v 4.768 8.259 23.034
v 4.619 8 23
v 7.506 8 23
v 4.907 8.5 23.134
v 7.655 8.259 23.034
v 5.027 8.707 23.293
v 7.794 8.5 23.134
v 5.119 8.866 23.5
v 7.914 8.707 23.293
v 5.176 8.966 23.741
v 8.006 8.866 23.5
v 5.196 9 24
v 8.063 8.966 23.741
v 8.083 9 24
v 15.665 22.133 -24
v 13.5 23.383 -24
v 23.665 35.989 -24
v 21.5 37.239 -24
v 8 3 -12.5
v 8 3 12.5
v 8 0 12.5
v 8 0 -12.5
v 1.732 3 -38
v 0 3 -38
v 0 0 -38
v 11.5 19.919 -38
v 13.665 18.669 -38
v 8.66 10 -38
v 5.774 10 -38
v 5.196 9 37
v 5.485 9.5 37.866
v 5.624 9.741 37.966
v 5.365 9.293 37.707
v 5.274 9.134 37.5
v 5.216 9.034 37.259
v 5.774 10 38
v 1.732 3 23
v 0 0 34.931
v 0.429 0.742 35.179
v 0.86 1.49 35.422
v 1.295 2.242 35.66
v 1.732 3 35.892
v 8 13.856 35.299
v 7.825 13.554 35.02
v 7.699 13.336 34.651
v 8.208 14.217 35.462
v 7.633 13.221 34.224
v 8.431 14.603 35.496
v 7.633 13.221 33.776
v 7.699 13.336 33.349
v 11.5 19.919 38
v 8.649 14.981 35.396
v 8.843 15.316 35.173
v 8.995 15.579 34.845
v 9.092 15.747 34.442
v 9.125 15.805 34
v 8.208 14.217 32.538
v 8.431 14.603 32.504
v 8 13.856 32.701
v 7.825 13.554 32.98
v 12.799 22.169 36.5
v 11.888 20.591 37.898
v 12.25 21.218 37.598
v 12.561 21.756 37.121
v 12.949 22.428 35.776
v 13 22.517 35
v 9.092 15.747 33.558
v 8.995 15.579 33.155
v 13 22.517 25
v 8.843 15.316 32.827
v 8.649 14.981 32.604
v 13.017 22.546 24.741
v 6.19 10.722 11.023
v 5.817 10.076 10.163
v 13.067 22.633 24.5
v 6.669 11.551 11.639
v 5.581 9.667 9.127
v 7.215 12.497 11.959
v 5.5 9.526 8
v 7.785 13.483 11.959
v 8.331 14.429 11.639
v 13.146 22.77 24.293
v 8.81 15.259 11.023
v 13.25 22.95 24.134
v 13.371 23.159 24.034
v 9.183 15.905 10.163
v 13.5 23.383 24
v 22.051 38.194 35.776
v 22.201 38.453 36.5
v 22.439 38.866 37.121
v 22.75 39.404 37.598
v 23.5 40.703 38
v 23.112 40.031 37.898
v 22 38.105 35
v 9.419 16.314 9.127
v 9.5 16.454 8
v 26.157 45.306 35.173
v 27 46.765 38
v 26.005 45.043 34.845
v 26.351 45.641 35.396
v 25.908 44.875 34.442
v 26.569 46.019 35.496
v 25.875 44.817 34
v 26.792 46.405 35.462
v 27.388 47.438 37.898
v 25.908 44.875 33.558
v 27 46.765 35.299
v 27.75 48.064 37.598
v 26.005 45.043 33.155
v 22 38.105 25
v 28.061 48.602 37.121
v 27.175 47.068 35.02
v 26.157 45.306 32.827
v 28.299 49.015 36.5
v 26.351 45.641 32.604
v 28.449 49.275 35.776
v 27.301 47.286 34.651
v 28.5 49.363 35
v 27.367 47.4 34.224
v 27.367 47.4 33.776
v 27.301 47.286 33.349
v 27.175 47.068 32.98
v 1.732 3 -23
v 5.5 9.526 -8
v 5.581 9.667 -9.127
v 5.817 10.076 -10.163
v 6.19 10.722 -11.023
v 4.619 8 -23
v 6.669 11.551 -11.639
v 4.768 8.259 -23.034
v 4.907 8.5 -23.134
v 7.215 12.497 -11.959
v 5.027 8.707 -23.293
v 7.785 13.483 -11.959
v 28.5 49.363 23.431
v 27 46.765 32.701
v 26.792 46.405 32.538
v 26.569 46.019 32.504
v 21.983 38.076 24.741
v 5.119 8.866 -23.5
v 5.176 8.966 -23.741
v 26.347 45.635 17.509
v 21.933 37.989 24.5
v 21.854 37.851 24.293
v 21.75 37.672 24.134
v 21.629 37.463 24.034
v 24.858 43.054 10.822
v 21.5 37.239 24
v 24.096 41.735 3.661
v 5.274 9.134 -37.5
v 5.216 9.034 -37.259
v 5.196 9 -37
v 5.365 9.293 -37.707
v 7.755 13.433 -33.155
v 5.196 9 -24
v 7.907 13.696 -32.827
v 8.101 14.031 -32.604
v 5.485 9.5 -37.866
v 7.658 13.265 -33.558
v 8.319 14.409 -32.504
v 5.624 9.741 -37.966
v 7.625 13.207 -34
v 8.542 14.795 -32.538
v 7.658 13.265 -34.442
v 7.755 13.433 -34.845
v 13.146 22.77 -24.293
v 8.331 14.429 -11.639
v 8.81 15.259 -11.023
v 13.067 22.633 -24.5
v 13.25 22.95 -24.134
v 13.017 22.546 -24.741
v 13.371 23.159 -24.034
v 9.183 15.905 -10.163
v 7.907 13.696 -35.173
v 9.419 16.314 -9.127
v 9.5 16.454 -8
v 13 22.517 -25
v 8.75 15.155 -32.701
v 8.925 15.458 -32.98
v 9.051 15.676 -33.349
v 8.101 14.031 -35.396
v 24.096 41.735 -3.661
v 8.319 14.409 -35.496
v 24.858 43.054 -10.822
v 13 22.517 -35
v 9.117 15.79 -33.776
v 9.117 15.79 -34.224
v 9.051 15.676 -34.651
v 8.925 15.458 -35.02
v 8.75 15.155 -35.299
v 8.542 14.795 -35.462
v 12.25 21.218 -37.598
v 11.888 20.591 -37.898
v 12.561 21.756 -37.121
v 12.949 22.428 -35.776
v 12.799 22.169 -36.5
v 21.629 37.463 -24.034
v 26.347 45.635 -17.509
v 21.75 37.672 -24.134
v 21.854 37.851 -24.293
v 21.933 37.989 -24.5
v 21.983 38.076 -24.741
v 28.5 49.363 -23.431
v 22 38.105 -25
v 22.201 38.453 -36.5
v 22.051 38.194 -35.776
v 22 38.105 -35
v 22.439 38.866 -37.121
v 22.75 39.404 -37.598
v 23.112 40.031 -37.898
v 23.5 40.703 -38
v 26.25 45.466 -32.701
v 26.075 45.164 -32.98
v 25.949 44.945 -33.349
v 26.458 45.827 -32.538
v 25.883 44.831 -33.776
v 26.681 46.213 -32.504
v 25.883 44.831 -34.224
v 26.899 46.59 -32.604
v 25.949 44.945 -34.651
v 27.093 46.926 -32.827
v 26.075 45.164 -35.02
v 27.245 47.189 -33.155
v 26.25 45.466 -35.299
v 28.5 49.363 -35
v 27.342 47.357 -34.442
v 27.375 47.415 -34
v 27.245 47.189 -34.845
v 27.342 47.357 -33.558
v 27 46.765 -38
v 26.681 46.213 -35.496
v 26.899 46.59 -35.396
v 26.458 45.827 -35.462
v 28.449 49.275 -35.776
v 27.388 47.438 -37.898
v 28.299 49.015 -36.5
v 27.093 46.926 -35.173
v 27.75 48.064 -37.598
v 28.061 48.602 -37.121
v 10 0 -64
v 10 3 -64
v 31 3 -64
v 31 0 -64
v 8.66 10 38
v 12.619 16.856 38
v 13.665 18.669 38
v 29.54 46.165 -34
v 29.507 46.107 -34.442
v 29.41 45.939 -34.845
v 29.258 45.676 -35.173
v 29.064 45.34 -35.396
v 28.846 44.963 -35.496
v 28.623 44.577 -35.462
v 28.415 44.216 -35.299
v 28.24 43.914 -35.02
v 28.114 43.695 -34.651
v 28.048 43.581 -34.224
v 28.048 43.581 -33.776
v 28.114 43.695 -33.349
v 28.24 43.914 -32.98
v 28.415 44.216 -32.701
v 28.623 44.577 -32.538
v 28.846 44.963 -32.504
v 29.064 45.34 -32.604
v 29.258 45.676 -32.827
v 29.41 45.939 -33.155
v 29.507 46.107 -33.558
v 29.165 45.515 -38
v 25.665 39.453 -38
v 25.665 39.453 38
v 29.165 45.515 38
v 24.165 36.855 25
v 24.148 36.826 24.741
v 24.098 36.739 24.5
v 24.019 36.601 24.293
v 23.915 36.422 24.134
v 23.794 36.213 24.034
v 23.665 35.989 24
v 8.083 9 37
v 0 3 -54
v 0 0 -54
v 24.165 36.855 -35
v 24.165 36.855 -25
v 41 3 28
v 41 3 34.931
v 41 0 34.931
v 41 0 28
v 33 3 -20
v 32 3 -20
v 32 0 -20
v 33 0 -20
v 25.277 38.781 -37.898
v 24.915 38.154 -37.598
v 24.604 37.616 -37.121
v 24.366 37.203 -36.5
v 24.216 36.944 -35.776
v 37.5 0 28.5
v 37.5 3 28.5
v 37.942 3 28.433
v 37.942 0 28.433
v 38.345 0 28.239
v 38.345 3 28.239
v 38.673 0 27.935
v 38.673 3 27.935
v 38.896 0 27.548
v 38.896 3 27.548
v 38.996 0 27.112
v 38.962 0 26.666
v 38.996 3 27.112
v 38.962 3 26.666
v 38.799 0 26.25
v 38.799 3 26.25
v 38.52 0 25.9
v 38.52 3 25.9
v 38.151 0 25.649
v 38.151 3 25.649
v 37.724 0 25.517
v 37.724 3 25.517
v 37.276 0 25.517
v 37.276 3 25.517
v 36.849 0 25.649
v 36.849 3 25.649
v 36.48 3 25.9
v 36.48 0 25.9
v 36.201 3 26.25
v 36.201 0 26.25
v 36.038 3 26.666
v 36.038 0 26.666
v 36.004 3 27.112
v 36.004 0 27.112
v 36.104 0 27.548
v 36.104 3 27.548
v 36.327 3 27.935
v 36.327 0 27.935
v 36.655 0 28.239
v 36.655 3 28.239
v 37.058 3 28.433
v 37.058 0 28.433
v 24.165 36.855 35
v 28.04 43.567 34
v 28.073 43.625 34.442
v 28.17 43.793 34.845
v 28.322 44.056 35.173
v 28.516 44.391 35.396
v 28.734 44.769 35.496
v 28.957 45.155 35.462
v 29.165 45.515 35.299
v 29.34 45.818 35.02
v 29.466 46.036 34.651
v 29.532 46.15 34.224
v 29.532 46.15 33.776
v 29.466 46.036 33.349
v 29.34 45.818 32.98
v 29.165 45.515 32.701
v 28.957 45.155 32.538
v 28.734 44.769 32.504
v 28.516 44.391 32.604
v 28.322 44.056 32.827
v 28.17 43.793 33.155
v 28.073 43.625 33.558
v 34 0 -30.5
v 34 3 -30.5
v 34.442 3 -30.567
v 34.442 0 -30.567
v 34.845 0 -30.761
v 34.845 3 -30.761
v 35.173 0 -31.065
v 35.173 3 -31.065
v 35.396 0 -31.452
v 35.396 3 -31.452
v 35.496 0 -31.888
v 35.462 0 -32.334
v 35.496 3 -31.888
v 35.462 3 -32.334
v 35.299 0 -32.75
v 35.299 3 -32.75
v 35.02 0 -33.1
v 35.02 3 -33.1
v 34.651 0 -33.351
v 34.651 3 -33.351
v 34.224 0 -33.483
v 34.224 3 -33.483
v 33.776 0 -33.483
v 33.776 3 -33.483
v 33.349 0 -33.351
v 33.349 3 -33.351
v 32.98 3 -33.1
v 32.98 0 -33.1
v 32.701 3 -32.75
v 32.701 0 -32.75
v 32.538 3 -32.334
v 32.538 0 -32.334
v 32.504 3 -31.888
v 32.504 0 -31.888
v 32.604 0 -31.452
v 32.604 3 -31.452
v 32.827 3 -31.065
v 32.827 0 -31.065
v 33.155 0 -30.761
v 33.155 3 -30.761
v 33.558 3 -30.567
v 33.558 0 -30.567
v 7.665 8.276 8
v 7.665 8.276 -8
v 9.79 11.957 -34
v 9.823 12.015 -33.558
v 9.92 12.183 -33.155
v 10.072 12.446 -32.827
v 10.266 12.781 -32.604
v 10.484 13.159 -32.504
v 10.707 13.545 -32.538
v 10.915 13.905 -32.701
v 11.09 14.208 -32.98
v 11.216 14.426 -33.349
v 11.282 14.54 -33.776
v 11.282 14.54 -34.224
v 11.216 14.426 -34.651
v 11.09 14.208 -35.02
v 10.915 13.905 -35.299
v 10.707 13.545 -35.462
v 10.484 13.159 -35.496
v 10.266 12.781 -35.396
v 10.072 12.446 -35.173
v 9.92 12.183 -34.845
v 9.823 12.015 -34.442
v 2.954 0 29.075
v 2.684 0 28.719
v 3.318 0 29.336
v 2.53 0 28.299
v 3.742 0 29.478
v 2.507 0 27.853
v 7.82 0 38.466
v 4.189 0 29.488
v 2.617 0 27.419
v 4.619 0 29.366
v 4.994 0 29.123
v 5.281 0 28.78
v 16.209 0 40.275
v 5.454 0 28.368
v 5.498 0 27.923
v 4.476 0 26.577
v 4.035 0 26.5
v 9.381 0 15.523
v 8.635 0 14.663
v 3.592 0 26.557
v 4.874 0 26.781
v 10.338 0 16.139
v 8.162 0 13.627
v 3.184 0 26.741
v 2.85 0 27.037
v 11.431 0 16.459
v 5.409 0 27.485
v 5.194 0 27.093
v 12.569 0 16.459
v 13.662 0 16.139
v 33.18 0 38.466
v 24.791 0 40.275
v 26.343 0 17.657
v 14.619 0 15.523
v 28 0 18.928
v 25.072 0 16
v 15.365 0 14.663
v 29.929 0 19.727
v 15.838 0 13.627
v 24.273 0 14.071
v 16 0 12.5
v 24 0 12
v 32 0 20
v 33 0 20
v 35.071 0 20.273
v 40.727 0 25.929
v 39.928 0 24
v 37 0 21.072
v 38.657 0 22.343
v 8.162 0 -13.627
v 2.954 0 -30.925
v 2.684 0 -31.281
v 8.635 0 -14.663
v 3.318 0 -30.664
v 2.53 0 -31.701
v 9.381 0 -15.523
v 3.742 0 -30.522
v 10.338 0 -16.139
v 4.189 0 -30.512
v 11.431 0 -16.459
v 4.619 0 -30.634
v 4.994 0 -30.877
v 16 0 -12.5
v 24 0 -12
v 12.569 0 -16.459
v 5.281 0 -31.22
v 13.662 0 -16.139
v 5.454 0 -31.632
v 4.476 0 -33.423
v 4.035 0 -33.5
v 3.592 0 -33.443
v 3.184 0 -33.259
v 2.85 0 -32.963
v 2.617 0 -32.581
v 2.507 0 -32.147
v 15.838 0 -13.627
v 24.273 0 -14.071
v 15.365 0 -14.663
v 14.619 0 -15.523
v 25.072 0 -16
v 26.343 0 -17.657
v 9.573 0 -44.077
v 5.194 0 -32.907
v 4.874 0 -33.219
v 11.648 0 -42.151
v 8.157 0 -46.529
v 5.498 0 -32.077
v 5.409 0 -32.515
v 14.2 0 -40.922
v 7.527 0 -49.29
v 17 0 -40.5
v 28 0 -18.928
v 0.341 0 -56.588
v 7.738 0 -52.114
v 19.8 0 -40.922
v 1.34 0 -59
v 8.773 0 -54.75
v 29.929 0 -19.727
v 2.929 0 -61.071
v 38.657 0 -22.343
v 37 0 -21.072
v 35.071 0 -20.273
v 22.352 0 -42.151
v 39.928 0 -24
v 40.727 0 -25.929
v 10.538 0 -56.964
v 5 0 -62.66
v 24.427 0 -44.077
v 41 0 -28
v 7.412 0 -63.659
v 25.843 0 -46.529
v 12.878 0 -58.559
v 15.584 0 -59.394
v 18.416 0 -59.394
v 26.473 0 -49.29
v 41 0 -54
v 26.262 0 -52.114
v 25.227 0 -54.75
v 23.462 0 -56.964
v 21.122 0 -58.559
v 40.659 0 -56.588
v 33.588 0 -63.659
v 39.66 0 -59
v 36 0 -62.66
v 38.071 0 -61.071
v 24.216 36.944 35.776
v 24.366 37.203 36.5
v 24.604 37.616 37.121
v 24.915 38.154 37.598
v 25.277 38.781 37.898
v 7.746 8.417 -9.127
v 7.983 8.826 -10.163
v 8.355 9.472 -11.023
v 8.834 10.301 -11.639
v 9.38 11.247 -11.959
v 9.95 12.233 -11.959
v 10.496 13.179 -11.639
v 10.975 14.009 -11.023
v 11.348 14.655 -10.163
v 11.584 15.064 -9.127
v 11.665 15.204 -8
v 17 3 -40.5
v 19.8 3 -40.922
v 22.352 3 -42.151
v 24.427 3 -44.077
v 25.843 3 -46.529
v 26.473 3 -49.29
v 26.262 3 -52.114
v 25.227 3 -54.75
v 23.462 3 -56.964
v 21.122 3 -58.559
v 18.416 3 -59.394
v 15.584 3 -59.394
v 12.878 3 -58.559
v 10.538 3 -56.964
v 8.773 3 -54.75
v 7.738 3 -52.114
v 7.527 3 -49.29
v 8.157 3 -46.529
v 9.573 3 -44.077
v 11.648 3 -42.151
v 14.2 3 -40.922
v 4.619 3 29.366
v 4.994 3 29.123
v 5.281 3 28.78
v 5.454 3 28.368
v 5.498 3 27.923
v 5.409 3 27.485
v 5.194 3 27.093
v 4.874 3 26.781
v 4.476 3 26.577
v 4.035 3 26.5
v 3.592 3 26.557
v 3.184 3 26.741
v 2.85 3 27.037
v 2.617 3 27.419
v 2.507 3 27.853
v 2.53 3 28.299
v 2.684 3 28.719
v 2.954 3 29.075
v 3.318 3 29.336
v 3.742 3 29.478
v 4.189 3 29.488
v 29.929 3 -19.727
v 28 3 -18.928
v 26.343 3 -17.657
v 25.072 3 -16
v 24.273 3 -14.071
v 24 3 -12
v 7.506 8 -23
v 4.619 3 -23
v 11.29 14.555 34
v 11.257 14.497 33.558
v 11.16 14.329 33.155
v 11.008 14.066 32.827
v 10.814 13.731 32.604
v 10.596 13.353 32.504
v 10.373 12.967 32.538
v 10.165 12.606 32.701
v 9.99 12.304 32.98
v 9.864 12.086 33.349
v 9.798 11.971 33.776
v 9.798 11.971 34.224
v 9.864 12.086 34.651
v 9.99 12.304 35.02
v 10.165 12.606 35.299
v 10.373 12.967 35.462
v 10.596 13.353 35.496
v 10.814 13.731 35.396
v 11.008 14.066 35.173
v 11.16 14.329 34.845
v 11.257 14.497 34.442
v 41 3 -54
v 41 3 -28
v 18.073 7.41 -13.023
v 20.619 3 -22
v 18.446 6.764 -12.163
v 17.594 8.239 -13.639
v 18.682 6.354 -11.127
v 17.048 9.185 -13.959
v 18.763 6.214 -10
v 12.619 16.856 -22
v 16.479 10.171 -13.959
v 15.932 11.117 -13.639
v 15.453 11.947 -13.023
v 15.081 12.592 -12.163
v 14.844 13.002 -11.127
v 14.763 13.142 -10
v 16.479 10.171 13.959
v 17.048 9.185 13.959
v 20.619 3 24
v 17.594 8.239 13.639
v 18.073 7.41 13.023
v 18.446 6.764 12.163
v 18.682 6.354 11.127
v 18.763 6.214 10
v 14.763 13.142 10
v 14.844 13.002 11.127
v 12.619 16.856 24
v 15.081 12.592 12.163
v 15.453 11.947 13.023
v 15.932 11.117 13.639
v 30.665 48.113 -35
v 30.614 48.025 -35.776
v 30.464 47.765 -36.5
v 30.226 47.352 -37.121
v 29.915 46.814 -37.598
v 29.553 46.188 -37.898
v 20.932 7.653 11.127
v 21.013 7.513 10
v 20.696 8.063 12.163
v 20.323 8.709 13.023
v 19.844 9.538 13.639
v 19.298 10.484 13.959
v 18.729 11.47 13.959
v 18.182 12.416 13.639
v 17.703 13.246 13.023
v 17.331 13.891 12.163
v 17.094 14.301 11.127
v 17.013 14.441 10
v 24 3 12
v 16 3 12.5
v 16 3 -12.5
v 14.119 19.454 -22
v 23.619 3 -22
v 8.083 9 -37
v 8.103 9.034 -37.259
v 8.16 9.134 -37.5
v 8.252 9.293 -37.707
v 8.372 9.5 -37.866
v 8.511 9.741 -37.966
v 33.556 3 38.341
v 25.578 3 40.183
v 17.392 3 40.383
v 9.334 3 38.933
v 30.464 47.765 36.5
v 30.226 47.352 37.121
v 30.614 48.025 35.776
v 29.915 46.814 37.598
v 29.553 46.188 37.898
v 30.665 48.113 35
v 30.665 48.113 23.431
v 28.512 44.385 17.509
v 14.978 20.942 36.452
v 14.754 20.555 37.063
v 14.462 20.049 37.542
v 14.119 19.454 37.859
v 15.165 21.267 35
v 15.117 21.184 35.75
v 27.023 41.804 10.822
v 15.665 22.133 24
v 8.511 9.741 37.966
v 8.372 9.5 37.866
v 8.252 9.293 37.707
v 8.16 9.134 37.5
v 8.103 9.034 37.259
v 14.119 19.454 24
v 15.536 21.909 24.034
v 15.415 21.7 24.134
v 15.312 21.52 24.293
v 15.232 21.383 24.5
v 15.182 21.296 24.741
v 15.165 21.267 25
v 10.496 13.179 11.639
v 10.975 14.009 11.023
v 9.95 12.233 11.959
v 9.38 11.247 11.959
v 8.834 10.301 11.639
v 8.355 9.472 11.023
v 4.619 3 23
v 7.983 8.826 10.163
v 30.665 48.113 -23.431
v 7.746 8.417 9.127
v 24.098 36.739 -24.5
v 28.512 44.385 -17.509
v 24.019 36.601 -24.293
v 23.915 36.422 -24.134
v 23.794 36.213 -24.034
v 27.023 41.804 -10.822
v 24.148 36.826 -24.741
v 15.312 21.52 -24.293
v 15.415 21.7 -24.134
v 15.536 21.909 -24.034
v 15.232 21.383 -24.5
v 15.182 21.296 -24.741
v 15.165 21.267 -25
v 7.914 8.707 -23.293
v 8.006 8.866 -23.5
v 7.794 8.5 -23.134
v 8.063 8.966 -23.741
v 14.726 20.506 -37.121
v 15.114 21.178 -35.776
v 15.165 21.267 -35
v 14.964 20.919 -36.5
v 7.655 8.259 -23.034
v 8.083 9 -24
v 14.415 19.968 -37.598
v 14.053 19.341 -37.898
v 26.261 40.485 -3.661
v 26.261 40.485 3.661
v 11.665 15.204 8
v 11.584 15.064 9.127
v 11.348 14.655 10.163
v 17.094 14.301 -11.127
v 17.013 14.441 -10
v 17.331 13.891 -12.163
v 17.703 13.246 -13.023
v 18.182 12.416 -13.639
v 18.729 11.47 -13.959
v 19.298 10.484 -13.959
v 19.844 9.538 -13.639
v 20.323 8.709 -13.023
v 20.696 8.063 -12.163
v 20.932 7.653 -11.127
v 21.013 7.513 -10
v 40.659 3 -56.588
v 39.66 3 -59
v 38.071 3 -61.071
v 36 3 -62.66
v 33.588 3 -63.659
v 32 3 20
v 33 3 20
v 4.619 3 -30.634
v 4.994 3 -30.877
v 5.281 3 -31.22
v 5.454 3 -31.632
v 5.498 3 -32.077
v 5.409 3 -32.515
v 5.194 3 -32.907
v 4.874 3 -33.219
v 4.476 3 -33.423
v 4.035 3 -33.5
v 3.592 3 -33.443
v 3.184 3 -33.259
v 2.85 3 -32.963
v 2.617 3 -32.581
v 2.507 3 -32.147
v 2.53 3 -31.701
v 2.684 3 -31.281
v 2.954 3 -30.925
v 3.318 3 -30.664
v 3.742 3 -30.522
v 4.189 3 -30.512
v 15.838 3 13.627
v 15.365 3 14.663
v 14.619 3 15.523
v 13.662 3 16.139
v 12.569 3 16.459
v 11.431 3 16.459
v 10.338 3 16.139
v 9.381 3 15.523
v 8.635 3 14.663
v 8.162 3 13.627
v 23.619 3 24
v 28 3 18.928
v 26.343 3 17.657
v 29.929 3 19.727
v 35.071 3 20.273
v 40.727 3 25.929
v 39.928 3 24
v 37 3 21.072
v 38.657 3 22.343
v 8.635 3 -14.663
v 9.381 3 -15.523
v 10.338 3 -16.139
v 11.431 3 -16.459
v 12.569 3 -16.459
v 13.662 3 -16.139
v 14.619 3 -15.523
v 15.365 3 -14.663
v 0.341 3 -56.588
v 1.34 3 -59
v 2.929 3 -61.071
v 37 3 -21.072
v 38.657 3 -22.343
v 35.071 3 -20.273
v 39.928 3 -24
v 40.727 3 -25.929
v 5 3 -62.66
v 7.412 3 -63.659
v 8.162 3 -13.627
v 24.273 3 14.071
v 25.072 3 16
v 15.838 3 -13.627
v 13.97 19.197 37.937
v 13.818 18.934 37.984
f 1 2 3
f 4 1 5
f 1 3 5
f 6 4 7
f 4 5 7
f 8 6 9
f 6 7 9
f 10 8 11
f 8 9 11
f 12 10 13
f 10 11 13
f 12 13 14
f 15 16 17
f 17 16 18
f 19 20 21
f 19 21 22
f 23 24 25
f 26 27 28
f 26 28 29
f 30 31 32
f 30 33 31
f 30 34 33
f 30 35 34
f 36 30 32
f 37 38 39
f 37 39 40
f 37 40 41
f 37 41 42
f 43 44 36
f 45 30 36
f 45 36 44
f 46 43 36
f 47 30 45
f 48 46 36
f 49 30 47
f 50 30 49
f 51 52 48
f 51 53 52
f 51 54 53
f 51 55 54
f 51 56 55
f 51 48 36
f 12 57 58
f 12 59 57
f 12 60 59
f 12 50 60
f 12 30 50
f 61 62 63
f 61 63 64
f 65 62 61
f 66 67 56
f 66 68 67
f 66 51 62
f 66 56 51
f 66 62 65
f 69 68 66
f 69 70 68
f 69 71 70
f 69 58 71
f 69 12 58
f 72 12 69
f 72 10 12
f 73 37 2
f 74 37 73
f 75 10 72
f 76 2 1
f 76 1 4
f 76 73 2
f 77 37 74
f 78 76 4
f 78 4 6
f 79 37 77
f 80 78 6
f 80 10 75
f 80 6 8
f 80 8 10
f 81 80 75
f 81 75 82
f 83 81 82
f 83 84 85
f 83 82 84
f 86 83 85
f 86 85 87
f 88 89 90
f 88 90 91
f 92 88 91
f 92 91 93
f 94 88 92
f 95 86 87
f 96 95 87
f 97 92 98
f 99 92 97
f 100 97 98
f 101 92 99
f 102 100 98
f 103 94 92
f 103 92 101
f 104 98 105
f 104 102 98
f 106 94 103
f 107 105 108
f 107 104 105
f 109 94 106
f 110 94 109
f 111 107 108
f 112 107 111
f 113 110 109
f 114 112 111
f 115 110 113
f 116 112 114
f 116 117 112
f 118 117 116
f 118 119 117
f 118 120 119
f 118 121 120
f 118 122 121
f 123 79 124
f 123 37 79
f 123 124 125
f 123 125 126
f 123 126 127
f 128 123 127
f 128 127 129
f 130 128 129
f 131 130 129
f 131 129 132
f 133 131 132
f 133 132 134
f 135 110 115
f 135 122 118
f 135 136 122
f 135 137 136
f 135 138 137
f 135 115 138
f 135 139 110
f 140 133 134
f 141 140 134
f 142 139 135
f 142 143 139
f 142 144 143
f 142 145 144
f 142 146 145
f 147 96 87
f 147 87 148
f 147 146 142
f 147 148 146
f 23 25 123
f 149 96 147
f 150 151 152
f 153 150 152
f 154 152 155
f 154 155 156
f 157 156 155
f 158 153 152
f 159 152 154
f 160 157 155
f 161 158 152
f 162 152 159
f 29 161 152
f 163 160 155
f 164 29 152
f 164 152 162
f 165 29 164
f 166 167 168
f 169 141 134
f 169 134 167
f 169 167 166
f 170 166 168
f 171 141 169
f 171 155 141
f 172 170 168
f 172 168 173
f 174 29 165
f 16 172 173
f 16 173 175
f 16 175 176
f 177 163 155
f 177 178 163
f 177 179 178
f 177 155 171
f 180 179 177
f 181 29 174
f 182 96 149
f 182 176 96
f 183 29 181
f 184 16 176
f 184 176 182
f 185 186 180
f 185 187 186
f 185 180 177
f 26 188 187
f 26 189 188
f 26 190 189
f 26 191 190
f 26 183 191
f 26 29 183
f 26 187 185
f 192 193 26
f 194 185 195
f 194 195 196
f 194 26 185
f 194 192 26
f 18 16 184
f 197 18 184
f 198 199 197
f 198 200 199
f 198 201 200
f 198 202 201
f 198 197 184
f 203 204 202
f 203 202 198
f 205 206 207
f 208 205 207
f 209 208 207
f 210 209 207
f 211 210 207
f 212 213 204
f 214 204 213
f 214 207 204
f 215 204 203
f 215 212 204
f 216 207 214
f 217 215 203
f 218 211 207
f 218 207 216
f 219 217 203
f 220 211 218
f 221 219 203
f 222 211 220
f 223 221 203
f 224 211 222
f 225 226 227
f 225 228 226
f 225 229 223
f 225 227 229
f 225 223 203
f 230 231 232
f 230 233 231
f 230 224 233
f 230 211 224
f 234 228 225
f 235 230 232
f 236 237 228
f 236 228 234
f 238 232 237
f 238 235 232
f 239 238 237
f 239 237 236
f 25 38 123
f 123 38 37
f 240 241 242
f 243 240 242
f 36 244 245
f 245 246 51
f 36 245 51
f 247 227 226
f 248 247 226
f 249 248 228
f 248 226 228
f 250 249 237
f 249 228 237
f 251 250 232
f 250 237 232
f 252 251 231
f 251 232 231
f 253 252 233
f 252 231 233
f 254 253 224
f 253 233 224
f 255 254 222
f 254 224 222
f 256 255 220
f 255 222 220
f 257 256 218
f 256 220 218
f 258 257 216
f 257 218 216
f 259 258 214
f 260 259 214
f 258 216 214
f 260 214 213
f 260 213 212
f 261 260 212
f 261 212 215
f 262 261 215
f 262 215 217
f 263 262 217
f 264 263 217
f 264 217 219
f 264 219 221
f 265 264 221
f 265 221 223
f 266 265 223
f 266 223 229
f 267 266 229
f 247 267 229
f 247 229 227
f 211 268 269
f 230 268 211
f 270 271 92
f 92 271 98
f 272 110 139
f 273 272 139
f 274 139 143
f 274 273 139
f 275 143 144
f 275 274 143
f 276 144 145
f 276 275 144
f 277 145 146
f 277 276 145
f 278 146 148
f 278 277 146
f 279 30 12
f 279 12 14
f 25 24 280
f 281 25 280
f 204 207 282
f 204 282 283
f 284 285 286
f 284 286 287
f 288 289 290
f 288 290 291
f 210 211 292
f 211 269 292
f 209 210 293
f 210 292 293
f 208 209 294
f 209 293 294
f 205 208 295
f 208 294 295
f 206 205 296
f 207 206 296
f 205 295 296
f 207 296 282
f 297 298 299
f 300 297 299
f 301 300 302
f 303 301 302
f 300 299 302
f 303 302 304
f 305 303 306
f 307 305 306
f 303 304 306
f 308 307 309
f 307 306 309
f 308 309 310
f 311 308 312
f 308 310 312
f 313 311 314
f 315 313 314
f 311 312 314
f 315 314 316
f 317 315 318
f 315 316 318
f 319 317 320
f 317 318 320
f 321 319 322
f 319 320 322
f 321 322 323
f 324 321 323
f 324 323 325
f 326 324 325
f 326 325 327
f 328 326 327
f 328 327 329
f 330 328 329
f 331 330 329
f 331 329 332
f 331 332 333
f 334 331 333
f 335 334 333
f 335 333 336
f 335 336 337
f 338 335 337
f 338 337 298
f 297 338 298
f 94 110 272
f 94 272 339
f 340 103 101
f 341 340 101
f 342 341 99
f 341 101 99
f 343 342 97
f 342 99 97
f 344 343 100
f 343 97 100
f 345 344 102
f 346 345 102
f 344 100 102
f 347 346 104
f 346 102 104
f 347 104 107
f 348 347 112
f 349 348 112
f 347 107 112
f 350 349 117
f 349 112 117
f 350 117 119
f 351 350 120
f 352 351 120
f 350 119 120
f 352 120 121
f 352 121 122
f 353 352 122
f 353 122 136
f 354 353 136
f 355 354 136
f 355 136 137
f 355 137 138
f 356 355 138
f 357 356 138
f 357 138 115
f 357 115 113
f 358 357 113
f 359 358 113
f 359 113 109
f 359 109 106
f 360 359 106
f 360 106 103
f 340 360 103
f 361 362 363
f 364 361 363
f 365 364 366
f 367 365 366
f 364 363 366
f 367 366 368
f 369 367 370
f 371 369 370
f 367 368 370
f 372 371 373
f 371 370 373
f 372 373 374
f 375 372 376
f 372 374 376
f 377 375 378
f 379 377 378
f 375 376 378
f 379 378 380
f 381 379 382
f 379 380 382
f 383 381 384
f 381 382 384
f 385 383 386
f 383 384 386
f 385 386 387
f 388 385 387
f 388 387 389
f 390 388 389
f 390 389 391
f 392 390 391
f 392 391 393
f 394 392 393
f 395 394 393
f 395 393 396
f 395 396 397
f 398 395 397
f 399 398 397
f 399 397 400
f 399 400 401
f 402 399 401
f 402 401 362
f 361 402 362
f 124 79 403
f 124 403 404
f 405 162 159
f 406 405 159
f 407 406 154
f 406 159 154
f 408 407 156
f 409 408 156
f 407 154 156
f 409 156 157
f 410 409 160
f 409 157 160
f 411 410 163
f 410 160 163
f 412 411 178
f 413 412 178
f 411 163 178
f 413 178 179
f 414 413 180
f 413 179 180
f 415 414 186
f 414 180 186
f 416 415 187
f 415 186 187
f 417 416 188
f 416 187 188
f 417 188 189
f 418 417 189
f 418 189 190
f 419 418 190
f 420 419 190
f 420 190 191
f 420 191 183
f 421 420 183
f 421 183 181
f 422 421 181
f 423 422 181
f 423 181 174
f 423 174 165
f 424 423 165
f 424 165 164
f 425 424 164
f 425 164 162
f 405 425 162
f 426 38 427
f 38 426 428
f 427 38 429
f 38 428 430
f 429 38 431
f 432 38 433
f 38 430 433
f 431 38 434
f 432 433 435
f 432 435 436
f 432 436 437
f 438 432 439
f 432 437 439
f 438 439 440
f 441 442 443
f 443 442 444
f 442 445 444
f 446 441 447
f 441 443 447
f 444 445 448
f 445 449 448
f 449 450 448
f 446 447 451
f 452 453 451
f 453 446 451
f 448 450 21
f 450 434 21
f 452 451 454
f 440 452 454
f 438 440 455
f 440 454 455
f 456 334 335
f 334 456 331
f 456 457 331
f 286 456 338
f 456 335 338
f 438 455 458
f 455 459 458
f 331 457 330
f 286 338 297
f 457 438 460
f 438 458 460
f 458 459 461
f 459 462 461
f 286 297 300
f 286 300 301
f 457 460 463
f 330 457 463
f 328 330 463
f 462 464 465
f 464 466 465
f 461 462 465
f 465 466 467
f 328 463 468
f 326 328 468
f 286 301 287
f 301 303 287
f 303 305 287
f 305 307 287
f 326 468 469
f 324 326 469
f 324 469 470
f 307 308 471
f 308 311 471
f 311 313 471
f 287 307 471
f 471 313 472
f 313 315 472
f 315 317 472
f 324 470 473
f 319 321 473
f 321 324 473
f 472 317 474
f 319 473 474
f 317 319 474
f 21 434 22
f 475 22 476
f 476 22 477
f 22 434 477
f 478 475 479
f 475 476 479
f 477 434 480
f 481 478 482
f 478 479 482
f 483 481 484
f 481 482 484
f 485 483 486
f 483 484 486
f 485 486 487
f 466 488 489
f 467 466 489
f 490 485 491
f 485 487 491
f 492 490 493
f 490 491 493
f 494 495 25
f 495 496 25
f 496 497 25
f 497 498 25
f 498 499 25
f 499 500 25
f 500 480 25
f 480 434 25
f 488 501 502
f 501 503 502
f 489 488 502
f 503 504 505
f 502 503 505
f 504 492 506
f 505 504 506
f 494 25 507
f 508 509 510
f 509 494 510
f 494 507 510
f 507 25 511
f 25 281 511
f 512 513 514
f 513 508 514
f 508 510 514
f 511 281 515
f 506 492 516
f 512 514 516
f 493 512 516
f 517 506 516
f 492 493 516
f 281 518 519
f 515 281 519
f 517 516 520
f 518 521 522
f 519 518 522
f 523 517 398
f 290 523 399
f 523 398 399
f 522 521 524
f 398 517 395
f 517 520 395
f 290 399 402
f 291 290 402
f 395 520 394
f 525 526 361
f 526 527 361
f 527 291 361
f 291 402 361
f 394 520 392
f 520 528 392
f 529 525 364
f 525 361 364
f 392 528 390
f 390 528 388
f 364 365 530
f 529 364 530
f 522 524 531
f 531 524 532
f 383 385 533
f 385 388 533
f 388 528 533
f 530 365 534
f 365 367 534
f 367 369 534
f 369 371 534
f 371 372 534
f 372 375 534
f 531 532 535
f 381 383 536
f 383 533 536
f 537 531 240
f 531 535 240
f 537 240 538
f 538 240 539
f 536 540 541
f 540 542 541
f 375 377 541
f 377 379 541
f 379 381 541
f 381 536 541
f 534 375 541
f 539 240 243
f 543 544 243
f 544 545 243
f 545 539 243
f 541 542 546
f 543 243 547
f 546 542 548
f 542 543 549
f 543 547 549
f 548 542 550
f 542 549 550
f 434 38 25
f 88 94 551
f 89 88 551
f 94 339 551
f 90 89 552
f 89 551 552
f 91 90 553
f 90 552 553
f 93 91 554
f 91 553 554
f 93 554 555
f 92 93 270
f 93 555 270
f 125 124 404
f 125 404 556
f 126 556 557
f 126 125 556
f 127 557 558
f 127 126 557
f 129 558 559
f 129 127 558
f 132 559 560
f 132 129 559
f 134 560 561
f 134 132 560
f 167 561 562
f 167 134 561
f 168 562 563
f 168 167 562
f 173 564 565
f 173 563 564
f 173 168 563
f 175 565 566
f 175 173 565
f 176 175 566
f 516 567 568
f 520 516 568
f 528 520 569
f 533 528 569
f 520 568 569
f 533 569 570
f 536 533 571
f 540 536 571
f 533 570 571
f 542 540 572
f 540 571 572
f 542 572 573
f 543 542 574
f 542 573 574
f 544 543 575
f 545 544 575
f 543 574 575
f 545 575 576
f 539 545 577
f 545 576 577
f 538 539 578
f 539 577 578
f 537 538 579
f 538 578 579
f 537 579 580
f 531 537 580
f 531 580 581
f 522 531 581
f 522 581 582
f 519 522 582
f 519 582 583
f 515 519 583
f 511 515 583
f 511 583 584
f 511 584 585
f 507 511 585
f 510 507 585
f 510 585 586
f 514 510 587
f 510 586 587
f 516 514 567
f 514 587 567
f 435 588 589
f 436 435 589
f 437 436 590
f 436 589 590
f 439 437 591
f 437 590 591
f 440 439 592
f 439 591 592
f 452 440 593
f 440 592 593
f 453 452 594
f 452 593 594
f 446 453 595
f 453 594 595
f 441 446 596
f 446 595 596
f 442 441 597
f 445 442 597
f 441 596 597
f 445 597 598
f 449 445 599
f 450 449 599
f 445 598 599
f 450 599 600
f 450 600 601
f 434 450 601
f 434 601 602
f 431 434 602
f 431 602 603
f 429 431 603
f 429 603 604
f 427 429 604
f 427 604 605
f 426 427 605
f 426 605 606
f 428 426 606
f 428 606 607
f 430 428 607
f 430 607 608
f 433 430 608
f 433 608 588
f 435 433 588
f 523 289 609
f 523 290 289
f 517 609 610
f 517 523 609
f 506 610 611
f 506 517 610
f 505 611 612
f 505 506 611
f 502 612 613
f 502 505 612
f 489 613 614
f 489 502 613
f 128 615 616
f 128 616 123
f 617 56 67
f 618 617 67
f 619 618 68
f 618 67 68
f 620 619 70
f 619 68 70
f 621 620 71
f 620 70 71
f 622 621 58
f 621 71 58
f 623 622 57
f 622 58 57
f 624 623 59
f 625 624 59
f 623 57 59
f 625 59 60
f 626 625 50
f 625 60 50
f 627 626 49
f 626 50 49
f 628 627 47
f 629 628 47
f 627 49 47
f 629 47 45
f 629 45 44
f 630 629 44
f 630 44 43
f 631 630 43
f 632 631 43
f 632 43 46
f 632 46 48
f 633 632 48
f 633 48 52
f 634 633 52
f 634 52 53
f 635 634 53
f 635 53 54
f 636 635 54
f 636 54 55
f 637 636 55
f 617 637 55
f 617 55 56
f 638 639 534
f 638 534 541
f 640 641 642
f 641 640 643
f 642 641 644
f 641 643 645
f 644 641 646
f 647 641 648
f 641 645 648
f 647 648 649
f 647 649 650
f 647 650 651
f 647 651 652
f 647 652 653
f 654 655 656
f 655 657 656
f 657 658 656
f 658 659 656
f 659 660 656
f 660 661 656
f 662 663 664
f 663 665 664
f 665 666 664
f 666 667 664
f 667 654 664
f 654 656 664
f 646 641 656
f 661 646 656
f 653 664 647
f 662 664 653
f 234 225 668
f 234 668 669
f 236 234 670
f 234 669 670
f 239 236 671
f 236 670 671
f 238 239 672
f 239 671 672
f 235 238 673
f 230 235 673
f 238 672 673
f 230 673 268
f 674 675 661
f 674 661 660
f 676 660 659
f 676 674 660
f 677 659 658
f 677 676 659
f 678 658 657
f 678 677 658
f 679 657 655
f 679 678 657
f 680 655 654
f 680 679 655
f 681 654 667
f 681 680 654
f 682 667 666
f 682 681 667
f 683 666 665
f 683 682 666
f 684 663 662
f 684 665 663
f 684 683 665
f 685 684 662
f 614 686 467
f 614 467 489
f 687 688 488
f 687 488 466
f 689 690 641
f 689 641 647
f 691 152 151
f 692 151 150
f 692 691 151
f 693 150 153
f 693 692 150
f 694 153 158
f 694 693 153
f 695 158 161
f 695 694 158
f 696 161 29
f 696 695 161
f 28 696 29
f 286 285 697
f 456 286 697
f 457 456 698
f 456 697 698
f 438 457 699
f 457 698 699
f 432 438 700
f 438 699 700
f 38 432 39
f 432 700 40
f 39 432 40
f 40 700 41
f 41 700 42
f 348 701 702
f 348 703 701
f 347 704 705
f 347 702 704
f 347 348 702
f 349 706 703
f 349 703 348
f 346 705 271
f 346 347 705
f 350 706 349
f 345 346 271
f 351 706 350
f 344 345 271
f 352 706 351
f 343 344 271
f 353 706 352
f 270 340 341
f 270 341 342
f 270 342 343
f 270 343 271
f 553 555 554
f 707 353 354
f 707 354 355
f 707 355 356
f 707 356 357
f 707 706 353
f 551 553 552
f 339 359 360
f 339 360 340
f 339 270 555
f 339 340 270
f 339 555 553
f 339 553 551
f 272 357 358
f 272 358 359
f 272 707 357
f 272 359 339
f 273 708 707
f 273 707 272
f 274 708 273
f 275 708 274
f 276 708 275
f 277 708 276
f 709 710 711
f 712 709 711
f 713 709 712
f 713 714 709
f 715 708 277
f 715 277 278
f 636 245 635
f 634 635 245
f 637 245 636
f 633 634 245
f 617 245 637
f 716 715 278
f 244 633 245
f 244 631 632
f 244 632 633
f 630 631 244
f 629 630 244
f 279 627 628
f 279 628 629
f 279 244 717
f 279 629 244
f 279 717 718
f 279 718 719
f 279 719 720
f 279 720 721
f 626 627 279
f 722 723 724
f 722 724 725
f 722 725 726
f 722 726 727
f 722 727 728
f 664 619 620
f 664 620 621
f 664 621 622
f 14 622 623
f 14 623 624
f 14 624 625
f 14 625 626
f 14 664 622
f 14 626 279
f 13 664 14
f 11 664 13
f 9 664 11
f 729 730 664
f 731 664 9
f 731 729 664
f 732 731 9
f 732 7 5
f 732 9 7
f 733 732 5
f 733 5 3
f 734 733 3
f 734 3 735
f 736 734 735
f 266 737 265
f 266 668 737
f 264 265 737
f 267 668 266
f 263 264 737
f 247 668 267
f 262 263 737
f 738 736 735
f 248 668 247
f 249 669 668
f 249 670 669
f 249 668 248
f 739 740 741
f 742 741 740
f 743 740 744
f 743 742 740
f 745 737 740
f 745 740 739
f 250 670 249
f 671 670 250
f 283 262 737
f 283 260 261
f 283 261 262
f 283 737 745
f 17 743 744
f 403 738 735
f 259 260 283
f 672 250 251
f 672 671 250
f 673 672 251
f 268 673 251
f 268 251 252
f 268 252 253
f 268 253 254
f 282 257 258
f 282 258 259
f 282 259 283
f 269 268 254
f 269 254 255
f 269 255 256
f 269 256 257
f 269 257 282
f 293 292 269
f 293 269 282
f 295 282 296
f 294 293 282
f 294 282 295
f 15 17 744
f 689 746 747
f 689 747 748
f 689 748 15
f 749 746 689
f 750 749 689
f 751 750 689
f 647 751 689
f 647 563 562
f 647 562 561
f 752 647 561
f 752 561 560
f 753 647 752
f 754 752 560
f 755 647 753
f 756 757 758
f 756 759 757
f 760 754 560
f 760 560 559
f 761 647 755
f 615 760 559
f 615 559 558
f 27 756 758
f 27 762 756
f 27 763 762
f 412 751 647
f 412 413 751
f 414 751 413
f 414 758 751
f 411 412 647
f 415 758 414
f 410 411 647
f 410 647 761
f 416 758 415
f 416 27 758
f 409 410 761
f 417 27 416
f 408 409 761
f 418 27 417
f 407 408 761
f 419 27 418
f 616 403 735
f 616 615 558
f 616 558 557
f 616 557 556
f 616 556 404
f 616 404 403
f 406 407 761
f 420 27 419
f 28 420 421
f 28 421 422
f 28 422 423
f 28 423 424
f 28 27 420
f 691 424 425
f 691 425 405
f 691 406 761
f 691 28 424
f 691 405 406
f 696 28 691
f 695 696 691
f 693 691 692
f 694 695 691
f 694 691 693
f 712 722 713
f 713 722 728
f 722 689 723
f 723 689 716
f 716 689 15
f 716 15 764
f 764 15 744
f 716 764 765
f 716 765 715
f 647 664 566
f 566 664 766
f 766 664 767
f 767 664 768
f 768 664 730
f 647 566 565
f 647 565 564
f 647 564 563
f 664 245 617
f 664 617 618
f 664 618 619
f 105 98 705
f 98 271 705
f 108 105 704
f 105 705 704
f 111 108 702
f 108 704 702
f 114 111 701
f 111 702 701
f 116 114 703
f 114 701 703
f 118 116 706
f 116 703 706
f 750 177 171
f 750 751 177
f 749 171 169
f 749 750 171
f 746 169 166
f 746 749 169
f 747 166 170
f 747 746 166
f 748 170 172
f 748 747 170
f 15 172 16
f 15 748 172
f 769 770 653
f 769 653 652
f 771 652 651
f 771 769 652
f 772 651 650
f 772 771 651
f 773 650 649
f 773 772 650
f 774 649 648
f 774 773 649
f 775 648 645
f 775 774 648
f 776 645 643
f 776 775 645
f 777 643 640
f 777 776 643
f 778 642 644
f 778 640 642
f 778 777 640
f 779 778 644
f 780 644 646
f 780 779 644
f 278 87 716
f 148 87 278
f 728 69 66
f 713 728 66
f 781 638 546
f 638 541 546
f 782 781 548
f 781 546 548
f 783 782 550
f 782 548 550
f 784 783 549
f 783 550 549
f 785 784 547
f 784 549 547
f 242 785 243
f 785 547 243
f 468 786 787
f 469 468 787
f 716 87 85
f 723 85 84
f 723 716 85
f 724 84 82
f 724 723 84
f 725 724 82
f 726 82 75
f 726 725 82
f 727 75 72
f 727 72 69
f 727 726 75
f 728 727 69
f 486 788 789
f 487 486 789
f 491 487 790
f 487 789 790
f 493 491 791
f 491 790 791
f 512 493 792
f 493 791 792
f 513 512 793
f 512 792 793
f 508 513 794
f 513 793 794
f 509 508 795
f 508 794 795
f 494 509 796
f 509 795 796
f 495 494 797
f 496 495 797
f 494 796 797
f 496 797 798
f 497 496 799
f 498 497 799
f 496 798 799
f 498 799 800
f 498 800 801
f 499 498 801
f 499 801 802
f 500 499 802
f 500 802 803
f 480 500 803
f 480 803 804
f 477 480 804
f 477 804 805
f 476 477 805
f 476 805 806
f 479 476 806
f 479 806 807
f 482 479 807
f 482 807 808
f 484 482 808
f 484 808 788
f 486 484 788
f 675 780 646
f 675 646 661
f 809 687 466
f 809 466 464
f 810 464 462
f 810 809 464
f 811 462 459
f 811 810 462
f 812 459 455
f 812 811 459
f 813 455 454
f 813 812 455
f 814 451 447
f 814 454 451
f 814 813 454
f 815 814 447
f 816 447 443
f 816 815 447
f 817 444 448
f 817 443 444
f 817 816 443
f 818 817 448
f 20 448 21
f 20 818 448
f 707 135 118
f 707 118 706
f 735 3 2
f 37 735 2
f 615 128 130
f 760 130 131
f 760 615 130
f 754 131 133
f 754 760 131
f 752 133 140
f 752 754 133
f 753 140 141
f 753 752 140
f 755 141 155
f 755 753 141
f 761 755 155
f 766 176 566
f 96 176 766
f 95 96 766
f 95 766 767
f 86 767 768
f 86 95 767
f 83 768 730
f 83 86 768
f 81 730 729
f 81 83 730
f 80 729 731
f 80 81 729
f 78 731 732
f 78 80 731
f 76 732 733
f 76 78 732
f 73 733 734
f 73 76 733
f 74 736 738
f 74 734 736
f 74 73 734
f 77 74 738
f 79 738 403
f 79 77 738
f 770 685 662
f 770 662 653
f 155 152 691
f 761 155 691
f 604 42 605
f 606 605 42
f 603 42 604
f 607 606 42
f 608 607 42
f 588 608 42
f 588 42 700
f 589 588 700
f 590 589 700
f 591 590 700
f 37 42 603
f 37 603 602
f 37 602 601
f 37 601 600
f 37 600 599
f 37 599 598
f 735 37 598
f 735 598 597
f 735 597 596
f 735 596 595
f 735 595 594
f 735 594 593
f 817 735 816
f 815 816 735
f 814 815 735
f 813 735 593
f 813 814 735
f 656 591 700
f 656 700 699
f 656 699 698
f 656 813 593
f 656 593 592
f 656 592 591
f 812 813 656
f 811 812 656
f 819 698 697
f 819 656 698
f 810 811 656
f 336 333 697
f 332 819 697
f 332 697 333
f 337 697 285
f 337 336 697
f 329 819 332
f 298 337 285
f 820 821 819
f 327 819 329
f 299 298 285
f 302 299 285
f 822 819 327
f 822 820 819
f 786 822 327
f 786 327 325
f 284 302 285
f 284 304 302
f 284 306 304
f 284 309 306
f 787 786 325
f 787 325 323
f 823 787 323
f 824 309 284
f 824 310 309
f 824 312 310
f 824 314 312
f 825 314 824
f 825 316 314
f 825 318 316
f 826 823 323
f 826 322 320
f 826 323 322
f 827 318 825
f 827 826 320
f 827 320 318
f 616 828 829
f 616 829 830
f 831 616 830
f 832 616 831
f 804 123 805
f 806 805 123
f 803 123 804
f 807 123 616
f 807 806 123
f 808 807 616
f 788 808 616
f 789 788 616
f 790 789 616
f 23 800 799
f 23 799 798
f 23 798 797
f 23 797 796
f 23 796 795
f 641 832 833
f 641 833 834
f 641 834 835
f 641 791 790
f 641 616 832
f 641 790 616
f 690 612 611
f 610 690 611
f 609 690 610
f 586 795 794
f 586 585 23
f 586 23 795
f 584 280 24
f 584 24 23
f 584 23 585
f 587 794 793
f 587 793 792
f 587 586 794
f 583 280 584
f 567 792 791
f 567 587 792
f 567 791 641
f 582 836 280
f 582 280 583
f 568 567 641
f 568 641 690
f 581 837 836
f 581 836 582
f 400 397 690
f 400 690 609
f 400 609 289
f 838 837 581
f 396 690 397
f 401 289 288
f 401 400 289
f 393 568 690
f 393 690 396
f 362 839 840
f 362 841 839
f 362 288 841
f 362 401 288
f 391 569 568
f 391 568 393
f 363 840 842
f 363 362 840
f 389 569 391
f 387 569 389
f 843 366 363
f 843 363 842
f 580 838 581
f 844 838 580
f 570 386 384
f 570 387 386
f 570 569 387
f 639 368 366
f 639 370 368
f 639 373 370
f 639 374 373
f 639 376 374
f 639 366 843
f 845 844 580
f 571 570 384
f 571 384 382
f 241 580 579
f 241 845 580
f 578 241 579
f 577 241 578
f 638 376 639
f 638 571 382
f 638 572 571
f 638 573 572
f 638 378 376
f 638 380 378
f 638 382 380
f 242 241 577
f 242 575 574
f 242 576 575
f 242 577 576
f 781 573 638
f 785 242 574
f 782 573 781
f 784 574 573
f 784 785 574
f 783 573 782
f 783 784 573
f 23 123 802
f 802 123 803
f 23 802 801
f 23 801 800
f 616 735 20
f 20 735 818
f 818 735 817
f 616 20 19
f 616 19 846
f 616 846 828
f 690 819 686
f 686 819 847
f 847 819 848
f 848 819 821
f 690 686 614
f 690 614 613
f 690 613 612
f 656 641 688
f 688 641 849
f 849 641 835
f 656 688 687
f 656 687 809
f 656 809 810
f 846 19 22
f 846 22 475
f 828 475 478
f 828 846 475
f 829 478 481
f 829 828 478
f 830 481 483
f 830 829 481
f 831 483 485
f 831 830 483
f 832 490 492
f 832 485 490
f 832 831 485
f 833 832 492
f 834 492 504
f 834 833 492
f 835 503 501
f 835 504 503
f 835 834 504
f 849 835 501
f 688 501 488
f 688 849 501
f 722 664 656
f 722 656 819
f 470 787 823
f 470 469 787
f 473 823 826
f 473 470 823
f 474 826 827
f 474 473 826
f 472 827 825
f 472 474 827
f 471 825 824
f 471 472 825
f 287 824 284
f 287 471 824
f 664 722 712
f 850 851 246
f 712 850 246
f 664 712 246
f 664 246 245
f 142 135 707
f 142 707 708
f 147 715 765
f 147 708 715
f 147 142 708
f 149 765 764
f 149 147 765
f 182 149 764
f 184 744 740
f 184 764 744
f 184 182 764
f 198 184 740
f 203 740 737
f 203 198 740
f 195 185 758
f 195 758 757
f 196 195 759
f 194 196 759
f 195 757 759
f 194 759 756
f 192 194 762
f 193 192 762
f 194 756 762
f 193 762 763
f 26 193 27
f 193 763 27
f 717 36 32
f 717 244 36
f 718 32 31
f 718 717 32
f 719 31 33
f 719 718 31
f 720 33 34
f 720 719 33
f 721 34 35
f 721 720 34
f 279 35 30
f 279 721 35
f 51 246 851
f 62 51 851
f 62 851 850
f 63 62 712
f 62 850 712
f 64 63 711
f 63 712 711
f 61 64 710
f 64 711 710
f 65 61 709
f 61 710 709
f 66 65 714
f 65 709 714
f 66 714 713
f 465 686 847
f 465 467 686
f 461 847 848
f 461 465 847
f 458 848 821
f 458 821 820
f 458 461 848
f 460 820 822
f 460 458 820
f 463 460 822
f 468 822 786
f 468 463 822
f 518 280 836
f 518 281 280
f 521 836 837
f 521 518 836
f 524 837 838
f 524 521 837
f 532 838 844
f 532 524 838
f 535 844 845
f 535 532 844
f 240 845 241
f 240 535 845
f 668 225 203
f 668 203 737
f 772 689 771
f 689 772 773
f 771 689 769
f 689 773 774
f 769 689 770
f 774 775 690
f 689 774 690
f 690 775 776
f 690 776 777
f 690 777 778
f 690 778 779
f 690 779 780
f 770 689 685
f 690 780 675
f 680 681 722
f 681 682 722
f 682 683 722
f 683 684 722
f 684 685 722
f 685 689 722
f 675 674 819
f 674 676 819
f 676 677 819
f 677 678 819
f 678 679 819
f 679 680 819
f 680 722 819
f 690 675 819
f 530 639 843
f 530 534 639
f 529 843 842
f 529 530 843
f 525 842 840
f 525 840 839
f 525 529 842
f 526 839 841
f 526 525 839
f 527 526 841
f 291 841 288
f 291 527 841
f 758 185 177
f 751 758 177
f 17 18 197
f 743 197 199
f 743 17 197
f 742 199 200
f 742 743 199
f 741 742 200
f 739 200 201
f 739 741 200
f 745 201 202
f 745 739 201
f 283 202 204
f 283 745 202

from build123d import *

# Parameters (mm, degrees)
EXTRUDE_1_DEPTH      = 38
EXTRUDE_1_DEPTH_BACK = 38
EXTRUDE_2_DEPTH      = 60
SKETCH_4_R           = 1.5
SKETCH_4_W           = 14
SKETCH_4_H           = 18
CUT_EXTRUDE_1_DEPTH  = 6
CUT_EXTRUDE_3_DEPTH  = 14
FILLET_2_R           = 3
CUT_EXTRUDE_6_DEPTH  = 3
SKETCH_13_R          = 1.5
CUT_EXTRUDE_7_DEPTH  = 10
CUT_EXTRUDE_9_DEPTH  = 15
SKETCH_17_W          = 41
SKETCH_17_H          = 26
SKETCH_17_R          = 9.5
SKETCH_17_R_2        = 1.5
EXTRUDE_3_DEPTH      = 3
FILLET_3_R           = 10
SKETCH_18_W          = 17
SKETCH_18_H          = 40
CUT_EXTRUDE_10_DEPTH = 10
FILLET_4_R           = 8
CUT_EXTRUDE_11_DEPTH = 4
FILLET_5_R           = 1
CUT_EXTRUDE_12_DEPTH = 10


with BuildPart() as part:
    # 草图2 → 凸台-拉伸1 (new, two sides: drawn at the far end of the back side and taken through both)
    with BuildSketch(Plane.XY.offset(-EXTRUDE_1_DEPTH_BACK)):
        Polygon((0, 0), (28.5, 49.363448016), (30.665063509, 48.113448016), (4.618802154, 3), (41, 3), (41, 0), align=None)
    extrude(amount=EXTRUDE_1_DEPTH + EXTRUDE_1_DEPTH_BACK)

    # 草图3 → 凸台-拉伸2 (add)
    with BuildSketch(Plane.XY.offset(38)):
        Polygon((12.618802154, 16.856406461), (14.118802154, 19.454482672), (23.618802154, 3), (20.618802154, 3), align=None)
    extrude(amount=-EXTRUDE_2_DEPTH)

    # 草图4 → 切除-拉伸1 (cut)
    with BuildSketch(Plane(origin=(0, 0, 0), x_dir=(0, 0, 1), z_dir=(-0.8660254037844365, 0.500000000000004, 0))):
        with Locations((34, 53.25)):
            Circle(SKETCH_4_R)
        with Locations((34, 16.75)):
            Circle(SKETCH_4_R)
        with Locations((-34, 16.75)):
            Circle(SKETCH_4_R)
        with Locations((-34, 53.25)):
            Circle(SKETCH_4_R)
        with Locations((31, 35)):
            Rectangle(SKETCH_4_W, SKETCH_4_H)
        with Locations((-31, 35)):
            Rectangle(SKETCH_4_W, SKETCH_4_H)
    extrude(amount=-CUT_EXTRUDE_1_DEPTH, mode=Mode.SUBTRACT)

    # 草图6 → 切除-拉伸3 (cut)
    with BuildSketch(Plane.XY.offset(38)):
        Polygon((23.618802154, 3), (14.118802154, 19.454482672), (12.618802154, 16.856406461), (20.618802154, 3), align=None)
    extrude(amount=-CUT_EXTRUDE_3_DEPTH, mode=Mode.SUBTRACT)

    # 圆角2
    fillet_2_edges = [part.edges().sort_by_distance(p)[0] for p in [
        (29.582531755, 48.738448016, -38),
        (23.082531755, 37.480117767, -38),
        (29.582531755, 48.738448016, 38),
        (23.082531755, 37.480117767, 38),
        (14.082531755, 21.891660498, 38),
        (14.082531755, 21.891660498, -38),
    ]]
    fillet(fillet_2_edges, radius=FILLET_2_R)

    # 草图11 → 切除-拉伸6 (cut)
    with BuildSketch(Plane(origin=(19.013139721, 10.977241336, 0), x_dir=(0, 0, -1), z_dir=(0.8660254037844374, 0.5000000000000022, 0))):
        with BuildLine():
            Line((-10, 4), (10, 4))
            ThreePointArc((10, 4), (14, 0), (10, -4))
            Line((10, -4), (-10, -4))
            ThreePointArc((-10, -4), (-14, 0), (-10, 4))
        make_face()
    extrude(amount=-CUT_EXTRUDE_6_DEPTH, mode=Mode.SUBTRACT)

    # 草图13 → 切除-拉伸7 (cut)
    with BuildSketch(Plane(origin=(0, 3, 0), x_dir=(1, 0, 0), z_dir=(0, 1, 0))):
        with Locations((37.5, -27)):
            Circle(SKETCH_13_R)
        with Locations((4, -28)):
            Circle(SKETCH_13_R)
        with Locations((34, 32)):
            Circle(SKETCH_13_R)
        with Locations((4, 32)):
            Circle(SKETCH_13_R)
    extrude(amount=-CUT_EXTRUDE_7_DEPTH, mode=Mode.SUBTRACT)

    # 草图15 → 切除-拉伸9 (cut)
    with BuildSketch(Plane.XY.offset(38)):
        Polygon((4.618802154, 3), (1.732050808, 3), (5.196152423, 9), (8.082903769, 9), align=None)
    cut_extrude_9 = extrude(amount=-CUT_EXTRUDE_9_DEPTH, mode=Mode.SUBTRACT)

    # 镜向1: 切除-拉伸9 across plane
    add(cut_extrude_9.mirror(Plane.XY), mode=Mode.SUBTRACT)

    # 草图17 → 凸台-拉伸3 (add)
    # profile 1 of 2: a face of its own
    with BuildSketch(Plane(origin=(0, 3, 0), x_dir=(1, 0, 0), z_dir=(0, 1, 0))):
        with Locations((20.5, 51)):
            Rectangle(SKETCH_17_W, SKETCH_17_H)
        with Locations((17, 50)):
            Circle(SKETCH_17_R, mode=Mode.SUBTRACT)
    # profile 2 of 2: a face of its own
    with BuildSketch(Plane(origin=(0, 3, 0), x_dir=(1, 0, 0), z_dir=(0, 1, 0))):
        with Locations((20.5, -51)):
            Rectangle(SKETCH_17_W, SKETCH_17_H)
        with Locations((5, -45)):
            Circle(SKETCH_17_R_2, mode=Mode.SUBTRACT)
        with Locations((5, -55)):
            Circle(SKETCH_17_R_2, mode=Mode.SUBTRACT)
        with Locations((35, -55)):
            Circle(SKETCH_17_R_2, mode=Mode.SUBTRACT)
        with Locations((35, -45)):
            Circle(SKETCH_17_R_2, mode=Mode.SUBTRACT)
        with Locations((20, -50)):
            Circle(SKETCH_17_R, mode=Mode.SUBTRACT)
    extrude(amount=-EXTRUDE_3_DEPTH)

    # 圆角3
    fillet_3_edges = [part.edges().sort_by_distance(p)[0] for p in [
        (41, 1.5, -64),
        (0, 1.5, -64),
        (41, 1.5, 64),
        (0, 1.5, 64),
    ]]
    fillet(fillet_3_edges, radius=FILLET_3_R)

    # 草图18 → 切除-拉伸10 (cut)
    with BuildSketch(Plane(origin=(0, 3, 0), x_dir=(1, 0, 0), z_dir=(0, 1, 0))):
        with Locations((32.5, 0)):
            Rectangle(SKETCH_18_W, SKETCH_18_H)
        with BuildLine():
            Line((8, -12.5), (8, 12.5))
            ThreePointArc((8, 12.5), (12, 16.5), (16, 12.5))
            Line((16, 12.5), (16, -12.5))
            ThreePointArc((16, -12.5), (12, -16.5), (8, -12.5))
        make_face()
    extrude(amount=-CUT_EXTRUDE_10_DEPTH, mode=Mode.SUBTRACT)

    # 圆角4
    fillet_4_edges = [part.edges().sort_by_distance(p)[0] for p in [
        (41, 1.5, -20),
        (24, 1.5, -20),
        (24, 1.5, 20),
        (41, 1.5, 20),
    ]]
    fillet(fillet_4_edges, radius=FILLET_4_R)

    # 草图21 → 切除-拉伸11 (cut)
    with BuildSketch(Plane(origin=(0, 0, 0), x_dir=(0, 0, 1), z_dir=(-0.8660254037844364, 0.5000000000000041, 0))):
        with BuildLine():
            Line((-23.430749028, 57), (23.430749028, 57))
            ThreePointArc((23.430749028, 57), (0, 48), (-23.430749028, 57))
        make_face()
        with BuildLine():
            Line((-8, 19), (8, 19))
            ThreePointArc((8, 19), (12, 15), (8, 11))
            Line((8, 11), (-8, 11))
            ThreePointArc((-8, 11), (-12, 15), (-8, 19))
        make_face()
    extrude(amount=-CUT_EXTRUDE_11_DEPTH, mode=Mode.SUBTRACT)

    # 圆角5
    fillet_5_edges = [part.edges().sort_by_distance(p)[0] for p in [
        (6.639528096, 9, -23),
        (6.639528096, 9, 23),
        (14.082531755, 21.891660498, 24),
        (23.082531755, 37.480117767, 24),
        (14.082531755, 21.891660498, -24),
        (23.082531755, 37.480117767, -24),
        (6.639528096, 9, 38),
        (6.639528096, 9, -38),
    ]]
    fillet(fillet_5_edges, radius=FILLET_5_R)

    # 草图22 → 切除-拉伸12 (cut)
    with BuildSketch(Plane(origin=(0, 3, 0), x_dir=(1, 0, 0), z_dir=(0, 1, 0))):
        with BuildLine():
            Line((0, -34.931397069), (0, -65.97672588))
            Line((0, -65.97672588), (41, -65.97672588))
            Line((41, -65.97672588), (41, -34.931397069))
            ThreePointArc((41, -34.931397069), (20.5, -40.502499938), (0, -34.931397069))
        make_face()
    extrude(amount=-CUT_EXTRUDE_12_DEPTH, mode=Mode.SUBTRACT)


solid = part.part
